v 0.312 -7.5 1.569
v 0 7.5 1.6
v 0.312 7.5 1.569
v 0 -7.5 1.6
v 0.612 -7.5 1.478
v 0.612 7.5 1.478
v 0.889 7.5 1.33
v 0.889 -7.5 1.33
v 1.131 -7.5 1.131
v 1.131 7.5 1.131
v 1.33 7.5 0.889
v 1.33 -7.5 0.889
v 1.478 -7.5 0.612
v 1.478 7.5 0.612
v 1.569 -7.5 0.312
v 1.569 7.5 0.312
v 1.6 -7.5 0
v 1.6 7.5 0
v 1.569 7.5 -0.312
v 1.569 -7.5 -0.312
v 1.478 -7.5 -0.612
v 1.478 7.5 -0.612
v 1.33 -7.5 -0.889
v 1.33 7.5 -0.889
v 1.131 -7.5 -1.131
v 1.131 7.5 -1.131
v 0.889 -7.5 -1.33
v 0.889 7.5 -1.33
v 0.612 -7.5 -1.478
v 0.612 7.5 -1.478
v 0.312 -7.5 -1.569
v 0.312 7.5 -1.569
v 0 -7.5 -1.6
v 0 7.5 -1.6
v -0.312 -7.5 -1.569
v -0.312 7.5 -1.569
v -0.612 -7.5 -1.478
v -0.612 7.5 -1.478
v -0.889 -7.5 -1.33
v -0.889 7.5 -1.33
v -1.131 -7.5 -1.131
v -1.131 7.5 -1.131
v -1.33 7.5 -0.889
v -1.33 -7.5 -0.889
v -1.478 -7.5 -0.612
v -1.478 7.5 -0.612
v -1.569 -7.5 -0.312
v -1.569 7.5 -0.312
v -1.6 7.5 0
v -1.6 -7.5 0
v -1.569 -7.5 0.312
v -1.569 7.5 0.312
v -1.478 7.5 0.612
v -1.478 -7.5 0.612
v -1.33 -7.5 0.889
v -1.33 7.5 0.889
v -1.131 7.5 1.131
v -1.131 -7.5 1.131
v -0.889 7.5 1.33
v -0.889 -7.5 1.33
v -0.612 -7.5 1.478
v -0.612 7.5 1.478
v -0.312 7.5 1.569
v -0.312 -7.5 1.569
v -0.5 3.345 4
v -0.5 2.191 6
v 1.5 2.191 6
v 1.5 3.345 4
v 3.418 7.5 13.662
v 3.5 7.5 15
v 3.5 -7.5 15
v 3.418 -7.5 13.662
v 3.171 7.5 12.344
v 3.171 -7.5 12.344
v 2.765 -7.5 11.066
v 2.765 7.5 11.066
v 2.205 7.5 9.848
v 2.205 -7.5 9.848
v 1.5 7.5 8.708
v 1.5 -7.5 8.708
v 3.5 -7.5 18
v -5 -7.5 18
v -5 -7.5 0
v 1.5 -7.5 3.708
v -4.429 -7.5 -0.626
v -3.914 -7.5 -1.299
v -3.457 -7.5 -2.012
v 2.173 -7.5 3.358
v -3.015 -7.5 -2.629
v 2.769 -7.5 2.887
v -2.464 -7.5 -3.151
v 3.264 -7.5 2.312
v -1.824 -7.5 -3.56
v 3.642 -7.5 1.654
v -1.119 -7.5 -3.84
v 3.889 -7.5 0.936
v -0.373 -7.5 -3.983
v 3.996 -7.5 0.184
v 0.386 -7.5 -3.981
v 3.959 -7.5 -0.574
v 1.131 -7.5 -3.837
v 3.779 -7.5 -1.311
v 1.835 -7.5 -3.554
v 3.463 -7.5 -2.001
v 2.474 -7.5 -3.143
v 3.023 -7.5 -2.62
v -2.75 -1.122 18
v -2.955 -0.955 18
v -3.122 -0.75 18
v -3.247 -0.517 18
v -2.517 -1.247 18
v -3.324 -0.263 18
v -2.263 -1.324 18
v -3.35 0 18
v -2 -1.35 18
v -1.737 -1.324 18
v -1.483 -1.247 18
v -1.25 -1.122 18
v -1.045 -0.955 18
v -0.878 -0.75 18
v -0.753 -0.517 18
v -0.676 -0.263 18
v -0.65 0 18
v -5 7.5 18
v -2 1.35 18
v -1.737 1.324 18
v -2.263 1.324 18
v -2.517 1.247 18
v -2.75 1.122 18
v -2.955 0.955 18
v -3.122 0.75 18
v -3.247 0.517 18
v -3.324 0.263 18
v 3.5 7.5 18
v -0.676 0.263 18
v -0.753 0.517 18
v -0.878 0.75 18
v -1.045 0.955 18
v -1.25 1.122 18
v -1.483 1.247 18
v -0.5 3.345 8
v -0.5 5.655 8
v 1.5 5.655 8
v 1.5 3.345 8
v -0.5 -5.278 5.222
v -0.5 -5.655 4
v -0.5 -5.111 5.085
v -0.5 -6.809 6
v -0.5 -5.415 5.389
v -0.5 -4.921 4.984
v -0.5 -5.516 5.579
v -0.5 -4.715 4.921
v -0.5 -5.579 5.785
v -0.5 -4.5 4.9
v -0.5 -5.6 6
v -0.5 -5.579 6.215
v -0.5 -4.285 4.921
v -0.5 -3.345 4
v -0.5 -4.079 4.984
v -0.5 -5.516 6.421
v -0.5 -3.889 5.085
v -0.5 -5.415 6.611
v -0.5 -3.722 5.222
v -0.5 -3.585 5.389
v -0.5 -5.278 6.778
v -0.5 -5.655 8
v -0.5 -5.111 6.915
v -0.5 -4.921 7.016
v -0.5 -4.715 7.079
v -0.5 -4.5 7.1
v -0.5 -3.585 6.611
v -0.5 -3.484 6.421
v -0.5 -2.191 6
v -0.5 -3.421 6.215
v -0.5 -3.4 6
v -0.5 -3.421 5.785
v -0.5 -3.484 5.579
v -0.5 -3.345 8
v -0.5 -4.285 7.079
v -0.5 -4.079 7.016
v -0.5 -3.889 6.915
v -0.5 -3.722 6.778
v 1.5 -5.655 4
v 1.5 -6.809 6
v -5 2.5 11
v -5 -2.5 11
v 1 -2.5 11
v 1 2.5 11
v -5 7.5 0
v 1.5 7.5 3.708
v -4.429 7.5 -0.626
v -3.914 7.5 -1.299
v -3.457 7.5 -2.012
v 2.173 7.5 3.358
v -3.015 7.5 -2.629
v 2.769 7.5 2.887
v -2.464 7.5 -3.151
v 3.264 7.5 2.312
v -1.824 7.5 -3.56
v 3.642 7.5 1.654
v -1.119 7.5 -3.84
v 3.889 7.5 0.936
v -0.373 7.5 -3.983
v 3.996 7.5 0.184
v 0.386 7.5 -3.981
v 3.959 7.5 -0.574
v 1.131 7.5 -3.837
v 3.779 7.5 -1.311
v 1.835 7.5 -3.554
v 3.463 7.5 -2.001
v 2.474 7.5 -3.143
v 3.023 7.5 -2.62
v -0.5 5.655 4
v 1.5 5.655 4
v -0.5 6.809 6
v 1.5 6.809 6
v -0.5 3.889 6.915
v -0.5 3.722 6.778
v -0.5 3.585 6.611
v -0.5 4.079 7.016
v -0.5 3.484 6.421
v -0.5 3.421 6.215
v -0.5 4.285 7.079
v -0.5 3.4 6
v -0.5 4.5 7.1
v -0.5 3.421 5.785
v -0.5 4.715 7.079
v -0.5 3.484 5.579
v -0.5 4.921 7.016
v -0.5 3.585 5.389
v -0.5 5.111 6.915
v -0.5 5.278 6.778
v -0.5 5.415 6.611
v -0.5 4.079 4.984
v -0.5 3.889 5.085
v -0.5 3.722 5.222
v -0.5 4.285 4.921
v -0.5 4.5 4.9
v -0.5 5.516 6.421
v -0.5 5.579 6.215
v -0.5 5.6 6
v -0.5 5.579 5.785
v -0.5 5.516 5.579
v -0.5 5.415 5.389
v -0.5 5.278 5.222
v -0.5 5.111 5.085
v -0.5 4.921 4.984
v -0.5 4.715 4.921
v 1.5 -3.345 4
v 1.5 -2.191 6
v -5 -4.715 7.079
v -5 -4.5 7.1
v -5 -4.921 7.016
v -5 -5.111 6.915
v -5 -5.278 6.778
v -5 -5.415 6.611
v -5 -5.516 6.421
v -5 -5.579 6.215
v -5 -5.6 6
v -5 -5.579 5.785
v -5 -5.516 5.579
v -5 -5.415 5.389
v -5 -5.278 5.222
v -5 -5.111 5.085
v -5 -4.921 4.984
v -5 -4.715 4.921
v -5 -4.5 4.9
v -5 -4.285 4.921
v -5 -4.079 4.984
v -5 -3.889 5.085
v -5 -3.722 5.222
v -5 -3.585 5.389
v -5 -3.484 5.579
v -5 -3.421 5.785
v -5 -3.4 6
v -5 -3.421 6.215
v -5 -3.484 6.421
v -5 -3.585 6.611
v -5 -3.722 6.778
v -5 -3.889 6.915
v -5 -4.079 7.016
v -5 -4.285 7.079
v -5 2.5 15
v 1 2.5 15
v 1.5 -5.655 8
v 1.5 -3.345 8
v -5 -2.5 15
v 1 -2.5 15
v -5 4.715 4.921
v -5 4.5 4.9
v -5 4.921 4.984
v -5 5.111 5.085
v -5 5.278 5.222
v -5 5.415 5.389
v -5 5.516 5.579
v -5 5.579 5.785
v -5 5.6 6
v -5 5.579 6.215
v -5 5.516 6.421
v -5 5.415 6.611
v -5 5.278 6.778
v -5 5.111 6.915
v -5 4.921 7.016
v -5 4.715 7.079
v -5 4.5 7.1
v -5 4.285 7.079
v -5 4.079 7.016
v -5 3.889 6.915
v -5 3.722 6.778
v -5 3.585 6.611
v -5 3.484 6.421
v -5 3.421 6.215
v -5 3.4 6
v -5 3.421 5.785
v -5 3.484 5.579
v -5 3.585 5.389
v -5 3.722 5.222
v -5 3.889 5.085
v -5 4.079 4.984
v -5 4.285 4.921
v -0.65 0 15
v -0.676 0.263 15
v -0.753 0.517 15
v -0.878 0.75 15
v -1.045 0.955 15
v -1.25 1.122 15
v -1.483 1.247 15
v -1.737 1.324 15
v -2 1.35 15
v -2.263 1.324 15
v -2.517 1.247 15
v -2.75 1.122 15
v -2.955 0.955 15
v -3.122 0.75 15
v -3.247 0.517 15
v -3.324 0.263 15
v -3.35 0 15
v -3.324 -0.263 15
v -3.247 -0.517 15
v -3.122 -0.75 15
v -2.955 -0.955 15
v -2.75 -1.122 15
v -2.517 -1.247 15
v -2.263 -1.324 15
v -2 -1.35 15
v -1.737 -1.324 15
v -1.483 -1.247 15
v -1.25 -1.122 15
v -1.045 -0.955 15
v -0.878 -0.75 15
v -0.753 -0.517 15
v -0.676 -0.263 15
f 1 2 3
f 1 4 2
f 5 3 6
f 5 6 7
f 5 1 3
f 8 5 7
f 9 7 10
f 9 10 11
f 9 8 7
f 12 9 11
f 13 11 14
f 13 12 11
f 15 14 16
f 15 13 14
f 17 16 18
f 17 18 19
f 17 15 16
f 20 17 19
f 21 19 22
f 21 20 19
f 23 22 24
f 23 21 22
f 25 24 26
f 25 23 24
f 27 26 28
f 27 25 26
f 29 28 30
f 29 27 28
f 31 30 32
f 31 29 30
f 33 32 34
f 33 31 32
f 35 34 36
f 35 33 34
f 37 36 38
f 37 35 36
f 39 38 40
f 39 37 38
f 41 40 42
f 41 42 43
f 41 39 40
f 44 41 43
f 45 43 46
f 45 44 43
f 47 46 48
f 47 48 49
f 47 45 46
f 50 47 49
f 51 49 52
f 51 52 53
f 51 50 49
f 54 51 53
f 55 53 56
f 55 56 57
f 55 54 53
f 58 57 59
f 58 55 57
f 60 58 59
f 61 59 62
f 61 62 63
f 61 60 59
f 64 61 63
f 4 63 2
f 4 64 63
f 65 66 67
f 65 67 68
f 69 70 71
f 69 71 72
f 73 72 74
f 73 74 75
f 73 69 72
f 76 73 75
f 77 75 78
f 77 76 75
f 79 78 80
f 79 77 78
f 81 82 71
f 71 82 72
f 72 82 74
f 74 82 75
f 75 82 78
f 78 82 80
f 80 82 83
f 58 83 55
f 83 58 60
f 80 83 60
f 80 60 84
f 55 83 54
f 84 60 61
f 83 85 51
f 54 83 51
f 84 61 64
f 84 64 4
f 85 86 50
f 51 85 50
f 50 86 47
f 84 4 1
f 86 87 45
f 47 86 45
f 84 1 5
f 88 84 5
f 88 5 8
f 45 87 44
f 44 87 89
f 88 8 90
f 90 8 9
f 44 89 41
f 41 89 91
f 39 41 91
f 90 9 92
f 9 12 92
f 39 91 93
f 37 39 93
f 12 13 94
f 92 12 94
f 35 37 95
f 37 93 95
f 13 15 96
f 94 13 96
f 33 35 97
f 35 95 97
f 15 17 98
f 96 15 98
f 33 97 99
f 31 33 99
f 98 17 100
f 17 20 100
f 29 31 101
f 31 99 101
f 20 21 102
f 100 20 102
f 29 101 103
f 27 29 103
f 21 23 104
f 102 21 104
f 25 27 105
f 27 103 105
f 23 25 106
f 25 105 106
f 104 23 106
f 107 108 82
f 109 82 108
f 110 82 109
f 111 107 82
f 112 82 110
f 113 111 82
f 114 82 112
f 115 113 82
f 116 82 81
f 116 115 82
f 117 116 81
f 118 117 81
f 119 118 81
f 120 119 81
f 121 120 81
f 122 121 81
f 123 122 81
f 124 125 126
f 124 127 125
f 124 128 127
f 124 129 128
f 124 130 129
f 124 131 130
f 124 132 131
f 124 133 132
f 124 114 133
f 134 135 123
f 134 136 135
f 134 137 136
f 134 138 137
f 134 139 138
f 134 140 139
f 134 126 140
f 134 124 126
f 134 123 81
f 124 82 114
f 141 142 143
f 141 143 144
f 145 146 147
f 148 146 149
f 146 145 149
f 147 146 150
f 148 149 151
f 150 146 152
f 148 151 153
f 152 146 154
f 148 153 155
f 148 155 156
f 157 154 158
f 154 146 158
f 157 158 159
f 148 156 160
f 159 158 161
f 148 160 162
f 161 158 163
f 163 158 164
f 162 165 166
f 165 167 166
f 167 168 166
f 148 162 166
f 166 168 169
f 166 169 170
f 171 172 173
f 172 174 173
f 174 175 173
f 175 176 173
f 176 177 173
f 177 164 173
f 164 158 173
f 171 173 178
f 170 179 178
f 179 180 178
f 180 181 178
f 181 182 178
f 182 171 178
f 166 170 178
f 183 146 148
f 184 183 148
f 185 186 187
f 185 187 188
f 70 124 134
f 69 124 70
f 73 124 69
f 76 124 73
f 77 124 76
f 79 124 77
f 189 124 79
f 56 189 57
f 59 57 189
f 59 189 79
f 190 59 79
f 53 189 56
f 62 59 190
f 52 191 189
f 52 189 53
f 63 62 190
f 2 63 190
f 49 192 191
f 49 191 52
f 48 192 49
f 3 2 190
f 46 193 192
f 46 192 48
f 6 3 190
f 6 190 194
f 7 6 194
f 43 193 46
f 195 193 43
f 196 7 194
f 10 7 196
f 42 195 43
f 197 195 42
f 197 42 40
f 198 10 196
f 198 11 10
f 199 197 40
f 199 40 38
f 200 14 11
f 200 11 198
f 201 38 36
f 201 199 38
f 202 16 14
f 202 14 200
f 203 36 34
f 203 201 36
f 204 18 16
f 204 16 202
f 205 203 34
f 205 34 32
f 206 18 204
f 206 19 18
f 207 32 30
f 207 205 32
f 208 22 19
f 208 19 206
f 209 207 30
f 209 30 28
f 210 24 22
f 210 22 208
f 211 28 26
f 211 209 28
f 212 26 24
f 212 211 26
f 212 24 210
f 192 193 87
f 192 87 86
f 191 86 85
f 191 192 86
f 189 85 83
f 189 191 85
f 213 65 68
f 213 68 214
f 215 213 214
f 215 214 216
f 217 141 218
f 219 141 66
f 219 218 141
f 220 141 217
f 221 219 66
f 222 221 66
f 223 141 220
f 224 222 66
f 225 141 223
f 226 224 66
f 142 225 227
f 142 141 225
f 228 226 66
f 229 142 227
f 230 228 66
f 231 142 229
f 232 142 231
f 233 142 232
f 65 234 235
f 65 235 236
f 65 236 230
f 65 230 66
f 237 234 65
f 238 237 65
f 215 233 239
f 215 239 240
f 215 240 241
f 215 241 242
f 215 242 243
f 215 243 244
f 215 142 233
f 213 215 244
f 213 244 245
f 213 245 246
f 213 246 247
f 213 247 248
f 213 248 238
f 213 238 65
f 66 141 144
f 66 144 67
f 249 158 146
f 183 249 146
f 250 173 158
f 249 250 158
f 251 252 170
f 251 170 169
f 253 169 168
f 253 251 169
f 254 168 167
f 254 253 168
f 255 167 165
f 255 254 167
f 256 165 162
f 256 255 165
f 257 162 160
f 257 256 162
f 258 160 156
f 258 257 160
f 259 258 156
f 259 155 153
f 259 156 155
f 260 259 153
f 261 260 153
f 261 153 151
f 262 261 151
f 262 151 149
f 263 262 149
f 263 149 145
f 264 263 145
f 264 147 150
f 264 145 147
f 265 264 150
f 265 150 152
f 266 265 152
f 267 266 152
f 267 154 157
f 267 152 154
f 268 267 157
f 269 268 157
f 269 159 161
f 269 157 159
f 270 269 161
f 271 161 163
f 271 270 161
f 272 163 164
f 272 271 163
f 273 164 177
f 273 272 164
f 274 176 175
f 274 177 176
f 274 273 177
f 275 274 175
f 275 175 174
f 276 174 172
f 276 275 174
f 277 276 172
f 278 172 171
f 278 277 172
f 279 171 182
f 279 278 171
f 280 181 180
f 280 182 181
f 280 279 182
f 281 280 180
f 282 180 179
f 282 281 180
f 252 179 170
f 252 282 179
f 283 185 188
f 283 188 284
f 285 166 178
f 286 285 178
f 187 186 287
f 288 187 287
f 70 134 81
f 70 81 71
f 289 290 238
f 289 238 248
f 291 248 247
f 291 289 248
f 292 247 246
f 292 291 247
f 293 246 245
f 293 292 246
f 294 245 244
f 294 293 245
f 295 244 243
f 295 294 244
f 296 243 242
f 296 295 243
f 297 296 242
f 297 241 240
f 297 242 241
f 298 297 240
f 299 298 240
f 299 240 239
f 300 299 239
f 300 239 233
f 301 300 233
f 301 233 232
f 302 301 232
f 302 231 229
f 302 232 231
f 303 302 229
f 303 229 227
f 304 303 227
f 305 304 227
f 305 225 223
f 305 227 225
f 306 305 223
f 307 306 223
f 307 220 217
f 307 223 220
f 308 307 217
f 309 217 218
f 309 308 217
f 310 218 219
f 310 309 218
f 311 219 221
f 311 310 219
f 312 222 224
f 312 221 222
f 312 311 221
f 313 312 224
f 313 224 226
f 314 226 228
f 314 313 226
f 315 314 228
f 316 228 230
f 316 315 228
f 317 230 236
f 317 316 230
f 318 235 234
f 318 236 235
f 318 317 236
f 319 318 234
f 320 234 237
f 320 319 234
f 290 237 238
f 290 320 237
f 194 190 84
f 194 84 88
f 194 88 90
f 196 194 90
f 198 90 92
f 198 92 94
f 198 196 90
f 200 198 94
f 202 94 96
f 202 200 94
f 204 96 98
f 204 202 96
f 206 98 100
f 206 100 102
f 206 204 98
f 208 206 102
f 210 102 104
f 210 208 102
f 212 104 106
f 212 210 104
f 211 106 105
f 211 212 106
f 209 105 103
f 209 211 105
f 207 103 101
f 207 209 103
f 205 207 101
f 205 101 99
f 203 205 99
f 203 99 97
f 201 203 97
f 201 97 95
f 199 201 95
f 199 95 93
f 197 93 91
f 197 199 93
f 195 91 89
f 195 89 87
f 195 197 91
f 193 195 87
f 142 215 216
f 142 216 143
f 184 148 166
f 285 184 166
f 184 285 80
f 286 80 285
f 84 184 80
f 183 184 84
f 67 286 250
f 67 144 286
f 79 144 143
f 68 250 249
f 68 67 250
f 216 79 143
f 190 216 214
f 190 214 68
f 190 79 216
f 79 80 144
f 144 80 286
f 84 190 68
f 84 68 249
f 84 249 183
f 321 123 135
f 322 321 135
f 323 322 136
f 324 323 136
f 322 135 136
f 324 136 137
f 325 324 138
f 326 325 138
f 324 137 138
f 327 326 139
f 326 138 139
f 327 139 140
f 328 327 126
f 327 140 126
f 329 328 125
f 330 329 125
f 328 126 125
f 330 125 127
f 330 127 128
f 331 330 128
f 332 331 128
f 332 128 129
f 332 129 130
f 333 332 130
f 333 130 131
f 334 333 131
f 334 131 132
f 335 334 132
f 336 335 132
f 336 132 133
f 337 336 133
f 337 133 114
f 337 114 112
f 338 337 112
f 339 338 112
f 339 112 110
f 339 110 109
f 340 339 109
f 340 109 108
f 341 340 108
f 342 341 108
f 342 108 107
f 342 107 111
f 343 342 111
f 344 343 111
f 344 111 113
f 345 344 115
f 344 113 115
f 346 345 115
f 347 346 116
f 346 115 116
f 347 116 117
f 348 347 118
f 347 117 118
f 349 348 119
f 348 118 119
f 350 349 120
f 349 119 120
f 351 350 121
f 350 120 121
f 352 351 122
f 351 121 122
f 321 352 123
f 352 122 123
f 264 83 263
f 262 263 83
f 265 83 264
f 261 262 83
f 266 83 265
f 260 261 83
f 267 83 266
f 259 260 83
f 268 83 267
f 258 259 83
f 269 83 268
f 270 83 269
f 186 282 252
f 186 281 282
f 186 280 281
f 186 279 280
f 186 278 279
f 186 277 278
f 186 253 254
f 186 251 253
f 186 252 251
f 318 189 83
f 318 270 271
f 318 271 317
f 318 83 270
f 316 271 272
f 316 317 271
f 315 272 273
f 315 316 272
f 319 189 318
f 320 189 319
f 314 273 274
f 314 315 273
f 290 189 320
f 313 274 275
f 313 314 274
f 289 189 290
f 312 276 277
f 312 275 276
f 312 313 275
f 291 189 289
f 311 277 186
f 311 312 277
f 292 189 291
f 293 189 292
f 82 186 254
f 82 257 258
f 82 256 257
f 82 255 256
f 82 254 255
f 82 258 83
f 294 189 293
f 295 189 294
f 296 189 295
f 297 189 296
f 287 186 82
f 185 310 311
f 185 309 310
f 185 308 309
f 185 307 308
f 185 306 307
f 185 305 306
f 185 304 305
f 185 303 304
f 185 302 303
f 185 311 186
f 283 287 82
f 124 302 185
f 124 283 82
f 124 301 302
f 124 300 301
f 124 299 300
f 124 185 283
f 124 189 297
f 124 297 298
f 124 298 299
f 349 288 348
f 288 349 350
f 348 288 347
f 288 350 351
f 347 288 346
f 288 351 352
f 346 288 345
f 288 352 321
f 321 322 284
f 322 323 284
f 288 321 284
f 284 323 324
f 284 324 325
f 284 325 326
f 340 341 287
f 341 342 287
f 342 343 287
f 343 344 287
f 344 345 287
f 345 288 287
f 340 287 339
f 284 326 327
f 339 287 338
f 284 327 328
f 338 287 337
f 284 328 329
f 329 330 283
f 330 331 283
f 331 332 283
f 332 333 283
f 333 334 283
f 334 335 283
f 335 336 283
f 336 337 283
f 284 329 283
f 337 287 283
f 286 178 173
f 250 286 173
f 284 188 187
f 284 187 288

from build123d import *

# Parameters (mm, degrees)
SKETCH_1_R               = 1.6
EXTRUDE_1_DEPTH          = 7.5
CUT_EXTRUDE_1_DEPTH      = 21.554804791
CUT_EXTRUDE_1_DEPTH_BACK = 21.554804791
SKETCH_3_R               = 1.1
FILLET_1_R               = 10
SKETCH_6_R               = 1.35
CUT_EXTRUDE_2_DEPTH      = 4
SKETCH_7_W               = 4
SKETCH_7_H               = 5
CUT_EXTRUDE_3_DEPTH      = 6
CUT_EXTRUDE_4_DEPTH      = 21.554804791
CUT_EXTRUDE_4_DEPTH_BACK = 2


with BuildPart() as part:
    # 草图1 → 凸台-拉伸1 (new, symmetric)
    with BuildSketch(Plane(origin=(0, 0, 0), x_dir=(1, 0, 0), z_dir=(0, 1, 0))):
        with BuildLine():
            Line((-5, -18), (3.5, -18))
            Line((3.5, -18), (3.5, -15))
            ThreePointArc((3.5, -15), (2.987970346, -11.698938991), (1.5, -8.708099244))
            Line((1.5, -8.708099244), (1.5, -3.708099244))
            ThreePointArc((1.5, -3.708099244), (2.236067977, 3.31662479), (-4, 0))
            Line((-4, 0), (-5, 0))
            Line((-5, 0), (-5, -18))
        make_face()
        with Locations(Location((0, 0, 0), (0, 0, 270))):
            Circle(SKETCH_1_R, mode=Mode.SUBTRACT)
    extrude(amount=EXTRUDE_1_DEPTH, both=True)

    # 草图3 → 切除-拉伸1 (cut, two sides: drawn at the far end of the back side and taken through both)
    with BuildSketch(Plane(origin=(1.5, 0, 0), x_dir=(0, 0, -1), z_dir=(1, 0, 0)).offset(-CUT_EXTRUDE_1_DEPTH_BACK)):
        with Locations((-6, 4.5)):
            Circle(SKETCH_3_R)
        with Locations(Location((-6, -4.5, 0), (0, 0, 180))):
            Circle(SKETCH_3_R)
    extrude(amount=CUT_EXTRUDE_1_DEPTH + CUT_EXTRUDE_1_DEPTH_BACK, mode=Mode.SUBTRACT)

    # 圆角1
    # the kernel refuses this fillet: 10 mm, written as the material it adds along each edge
    with BuildSketch(Plane(origin=(-4, 7.5, 0), x_dir=(-1, 0, 0), z_dir=(0, -1, 0))) as fillet_1_piece_1:
        with BuildLine():
            CenterArc((8.1, 7.042016757), FILLET_1_R, 210.198757023, 14.566327648)
            Line((-0.542857143, 2.012004788), (-0.715714286, 1.911404548))
            ThreePointArc((-0.715714286, 1.911404548), (-0.331193265, 0.989877337), (-0.2, 0))
            Line((-0.2, 0), (0, -0.2))
            ThreePointArc((0, -0.2), (0.5, -0.2), (0.858, -0.140840335))
            Line((0.858, -0.140840335), (1, 0))
        make_face()
    extrude(amount=15)

    # 草图6 → 切除-拉伸2 (cut)
    with BuildSketch(Plane.XY.offset(18)):
        with Locations((-2, 0)):
            Circle(SKETCH_6_R)
    extrude(amount=-CUT_EXTRUDE_2_DEPTH, mode=Mode.SUBTRACT)

    # 草图7 → 切除-拉伸3 (cut)
    with BuildSketch(Plane.ZY.offset(5)):
        with Locations((13, 0)):
            Rectangle(SKETCH_7_W, SKETCH_7_H)
    extrude(amount=-CUT_EXTRUDE_3_DEPTH, mode=Mode.SUBTRACT)

    # 草图8 → 切除-拉伸4 (cut, two sides: drawn at the far end of the back side and taken through both)
    with BuildSketch(Plane(origin=(1.5, 0, 0), x_dir=(0, 0, -1), z_dir=(1, 0, 0)).offset(-CUT_EXTRUDE_4_DEPTH_BACK)):
        Polygon((-8, 5.654700538), (-8, 3.345299462), (-6, 2.190598923), (-4, 3.345299462), (-4, 5.654700538), (-6, 6.809401077), align=None)
        Polygon((-6, -6.809401077), (-8, -5.654700538), (-8, -3.345299462), (-6, -2.190598923), (-4, -3.345299462), (-4, -5.654700538), align=None)
    extrude(amount=CUT_EXTRUDE_4_DEPTH + CUT_EXTRUDE_4_DEPTH_BACK, mode=Mode.SUBTRACT)


solid = part.part
